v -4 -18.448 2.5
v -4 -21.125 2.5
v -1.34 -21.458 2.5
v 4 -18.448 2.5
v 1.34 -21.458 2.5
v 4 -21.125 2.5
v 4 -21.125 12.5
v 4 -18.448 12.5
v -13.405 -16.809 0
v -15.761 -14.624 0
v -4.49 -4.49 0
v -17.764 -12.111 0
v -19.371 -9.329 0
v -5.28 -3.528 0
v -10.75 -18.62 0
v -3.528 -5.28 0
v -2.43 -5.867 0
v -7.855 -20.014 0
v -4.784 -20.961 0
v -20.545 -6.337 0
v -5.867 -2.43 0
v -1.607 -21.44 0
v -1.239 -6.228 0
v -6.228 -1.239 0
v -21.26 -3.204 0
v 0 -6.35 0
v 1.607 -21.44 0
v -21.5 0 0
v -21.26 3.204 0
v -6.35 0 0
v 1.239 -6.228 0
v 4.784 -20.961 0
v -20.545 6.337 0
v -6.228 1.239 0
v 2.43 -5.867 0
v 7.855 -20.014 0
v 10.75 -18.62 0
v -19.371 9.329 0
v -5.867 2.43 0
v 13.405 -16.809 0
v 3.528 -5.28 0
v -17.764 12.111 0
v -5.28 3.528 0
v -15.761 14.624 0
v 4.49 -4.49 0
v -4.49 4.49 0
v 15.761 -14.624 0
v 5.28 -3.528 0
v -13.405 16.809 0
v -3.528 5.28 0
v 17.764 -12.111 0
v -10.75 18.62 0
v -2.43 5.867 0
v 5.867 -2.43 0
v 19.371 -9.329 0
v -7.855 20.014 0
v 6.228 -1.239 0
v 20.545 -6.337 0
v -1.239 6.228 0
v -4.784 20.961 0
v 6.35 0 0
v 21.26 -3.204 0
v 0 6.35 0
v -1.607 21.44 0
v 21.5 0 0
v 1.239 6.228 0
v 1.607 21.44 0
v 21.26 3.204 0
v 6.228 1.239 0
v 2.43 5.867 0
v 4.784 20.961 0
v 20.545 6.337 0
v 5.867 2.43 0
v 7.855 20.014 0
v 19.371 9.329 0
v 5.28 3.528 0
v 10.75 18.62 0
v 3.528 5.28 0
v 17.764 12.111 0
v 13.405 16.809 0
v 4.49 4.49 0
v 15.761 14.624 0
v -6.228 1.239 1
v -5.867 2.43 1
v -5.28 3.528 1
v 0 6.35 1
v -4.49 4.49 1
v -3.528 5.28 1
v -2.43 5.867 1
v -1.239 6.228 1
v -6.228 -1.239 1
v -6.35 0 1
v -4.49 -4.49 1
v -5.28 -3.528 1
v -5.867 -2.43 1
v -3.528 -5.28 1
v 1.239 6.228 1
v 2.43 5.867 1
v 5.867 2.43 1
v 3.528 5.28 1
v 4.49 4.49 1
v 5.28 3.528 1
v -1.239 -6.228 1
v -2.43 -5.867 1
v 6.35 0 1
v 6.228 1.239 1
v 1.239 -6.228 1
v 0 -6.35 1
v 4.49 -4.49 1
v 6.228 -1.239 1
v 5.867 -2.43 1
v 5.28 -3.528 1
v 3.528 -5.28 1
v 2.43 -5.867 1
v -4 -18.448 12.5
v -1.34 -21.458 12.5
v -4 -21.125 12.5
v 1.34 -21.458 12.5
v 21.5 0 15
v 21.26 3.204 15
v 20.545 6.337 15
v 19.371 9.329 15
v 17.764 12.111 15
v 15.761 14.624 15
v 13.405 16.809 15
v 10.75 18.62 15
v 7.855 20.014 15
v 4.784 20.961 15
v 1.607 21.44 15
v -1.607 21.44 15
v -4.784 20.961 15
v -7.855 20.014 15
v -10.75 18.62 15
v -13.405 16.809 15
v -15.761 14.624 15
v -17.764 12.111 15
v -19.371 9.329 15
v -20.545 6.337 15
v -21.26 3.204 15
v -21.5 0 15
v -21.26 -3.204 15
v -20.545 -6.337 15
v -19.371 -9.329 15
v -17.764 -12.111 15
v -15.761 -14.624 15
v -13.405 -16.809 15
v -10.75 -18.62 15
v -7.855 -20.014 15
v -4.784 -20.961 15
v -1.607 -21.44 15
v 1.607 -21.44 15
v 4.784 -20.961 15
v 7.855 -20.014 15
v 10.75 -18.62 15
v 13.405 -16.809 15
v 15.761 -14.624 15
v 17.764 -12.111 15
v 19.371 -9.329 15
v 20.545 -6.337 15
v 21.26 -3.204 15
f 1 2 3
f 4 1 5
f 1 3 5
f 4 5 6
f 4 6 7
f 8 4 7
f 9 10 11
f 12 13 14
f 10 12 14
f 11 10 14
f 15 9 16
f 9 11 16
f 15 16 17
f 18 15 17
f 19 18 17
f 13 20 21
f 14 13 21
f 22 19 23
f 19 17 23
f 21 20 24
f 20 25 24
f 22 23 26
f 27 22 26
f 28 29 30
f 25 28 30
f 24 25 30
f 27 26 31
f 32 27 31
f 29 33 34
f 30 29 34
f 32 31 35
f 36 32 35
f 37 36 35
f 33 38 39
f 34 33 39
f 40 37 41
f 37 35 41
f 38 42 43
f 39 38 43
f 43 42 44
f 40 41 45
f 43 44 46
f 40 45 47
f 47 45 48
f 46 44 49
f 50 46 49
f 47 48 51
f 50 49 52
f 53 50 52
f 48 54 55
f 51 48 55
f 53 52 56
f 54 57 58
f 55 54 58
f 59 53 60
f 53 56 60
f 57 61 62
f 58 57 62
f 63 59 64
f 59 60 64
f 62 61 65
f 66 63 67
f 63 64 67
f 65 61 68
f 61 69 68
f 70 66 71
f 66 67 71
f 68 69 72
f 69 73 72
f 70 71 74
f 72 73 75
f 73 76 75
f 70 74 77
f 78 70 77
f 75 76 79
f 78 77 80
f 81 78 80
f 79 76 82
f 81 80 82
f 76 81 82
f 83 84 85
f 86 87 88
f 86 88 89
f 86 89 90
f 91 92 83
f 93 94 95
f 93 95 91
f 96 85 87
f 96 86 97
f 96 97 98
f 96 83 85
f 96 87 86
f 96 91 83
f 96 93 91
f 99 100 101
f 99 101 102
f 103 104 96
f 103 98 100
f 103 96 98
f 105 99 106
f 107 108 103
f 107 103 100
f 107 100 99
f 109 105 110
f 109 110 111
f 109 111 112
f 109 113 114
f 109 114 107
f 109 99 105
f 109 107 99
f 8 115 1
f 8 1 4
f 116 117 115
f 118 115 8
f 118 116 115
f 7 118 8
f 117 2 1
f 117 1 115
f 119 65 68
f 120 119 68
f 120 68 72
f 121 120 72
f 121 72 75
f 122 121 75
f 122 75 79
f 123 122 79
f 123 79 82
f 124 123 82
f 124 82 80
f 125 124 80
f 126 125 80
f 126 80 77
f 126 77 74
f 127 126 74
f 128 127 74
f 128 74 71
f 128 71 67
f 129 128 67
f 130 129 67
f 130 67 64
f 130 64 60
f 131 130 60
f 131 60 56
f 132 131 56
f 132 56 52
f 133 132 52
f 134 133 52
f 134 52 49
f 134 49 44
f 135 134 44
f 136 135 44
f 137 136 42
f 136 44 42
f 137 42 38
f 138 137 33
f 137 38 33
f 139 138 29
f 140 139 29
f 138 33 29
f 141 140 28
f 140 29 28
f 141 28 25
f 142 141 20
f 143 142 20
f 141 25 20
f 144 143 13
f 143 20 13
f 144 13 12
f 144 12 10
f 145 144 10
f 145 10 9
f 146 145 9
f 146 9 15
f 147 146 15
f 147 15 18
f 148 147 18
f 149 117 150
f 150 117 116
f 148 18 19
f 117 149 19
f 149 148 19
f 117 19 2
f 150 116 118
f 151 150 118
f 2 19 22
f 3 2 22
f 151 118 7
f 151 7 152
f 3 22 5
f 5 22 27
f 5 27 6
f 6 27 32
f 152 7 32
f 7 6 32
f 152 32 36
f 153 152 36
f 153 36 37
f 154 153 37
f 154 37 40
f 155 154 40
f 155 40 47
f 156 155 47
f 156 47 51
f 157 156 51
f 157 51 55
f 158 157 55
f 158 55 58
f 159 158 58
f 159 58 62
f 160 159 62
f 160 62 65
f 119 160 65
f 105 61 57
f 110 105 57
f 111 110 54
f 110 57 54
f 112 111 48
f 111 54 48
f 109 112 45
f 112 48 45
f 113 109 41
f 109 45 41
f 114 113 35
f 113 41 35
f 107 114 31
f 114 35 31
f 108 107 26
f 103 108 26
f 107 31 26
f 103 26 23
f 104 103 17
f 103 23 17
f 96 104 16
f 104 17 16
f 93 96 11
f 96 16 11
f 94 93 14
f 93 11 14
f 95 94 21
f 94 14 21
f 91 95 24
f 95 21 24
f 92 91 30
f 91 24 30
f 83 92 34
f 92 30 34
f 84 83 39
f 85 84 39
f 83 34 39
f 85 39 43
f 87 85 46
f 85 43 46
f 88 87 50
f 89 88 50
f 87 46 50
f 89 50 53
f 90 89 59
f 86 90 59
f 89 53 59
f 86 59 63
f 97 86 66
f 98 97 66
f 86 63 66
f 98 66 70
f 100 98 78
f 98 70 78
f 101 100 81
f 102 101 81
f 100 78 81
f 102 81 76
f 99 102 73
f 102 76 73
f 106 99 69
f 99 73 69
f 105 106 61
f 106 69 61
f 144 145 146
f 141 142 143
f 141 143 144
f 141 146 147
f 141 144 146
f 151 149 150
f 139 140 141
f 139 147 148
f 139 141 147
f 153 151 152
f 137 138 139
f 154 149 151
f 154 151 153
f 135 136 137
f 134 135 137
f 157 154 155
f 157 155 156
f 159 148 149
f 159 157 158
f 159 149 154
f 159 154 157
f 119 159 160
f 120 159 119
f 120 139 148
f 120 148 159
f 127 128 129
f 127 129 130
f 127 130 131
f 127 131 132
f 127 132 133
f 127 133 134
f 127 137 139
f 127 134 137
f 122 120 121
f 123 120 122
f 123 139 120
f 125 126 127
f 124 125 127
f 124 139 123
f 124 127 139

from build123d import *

# Parameters (mm, degrees)
F0_R     = 21.5
F1_DEPTH = 15
F3_W     = 8
F3_H     = 10
F4_DEPTH = 10
F5_R     = 6.35
F6_DEPTH = 1


with BuildPart() as f1:
    # F0 (on Top) → F1 (new body)
    with BuildSketch(Plane.XY):
        Circle(F0_R)
    extrude(amount=F1_DEPTH)

    # F3 (on offset) → F4 (cut)
    with BuildSketch(Plane.XZ.offset(28.448)):
        with Locations((0, 7.5)):
            Rectangle(F3_W, F3_H)
    extrude(amount=-F4_DEPTH, mode=Mode.SUBTRACT)

    # F5 (on face) → F6 (cut)
    with BuildSketch(Plane(origin=(0, 0, 0), x_dir=(1, 0, 0), z_dir=(0, 0, -1))):
        Circle(F5_R)
    extrude(amount=-F6_DEPTH, mode=Mode.SUBTRACT)


solid = f1.part
